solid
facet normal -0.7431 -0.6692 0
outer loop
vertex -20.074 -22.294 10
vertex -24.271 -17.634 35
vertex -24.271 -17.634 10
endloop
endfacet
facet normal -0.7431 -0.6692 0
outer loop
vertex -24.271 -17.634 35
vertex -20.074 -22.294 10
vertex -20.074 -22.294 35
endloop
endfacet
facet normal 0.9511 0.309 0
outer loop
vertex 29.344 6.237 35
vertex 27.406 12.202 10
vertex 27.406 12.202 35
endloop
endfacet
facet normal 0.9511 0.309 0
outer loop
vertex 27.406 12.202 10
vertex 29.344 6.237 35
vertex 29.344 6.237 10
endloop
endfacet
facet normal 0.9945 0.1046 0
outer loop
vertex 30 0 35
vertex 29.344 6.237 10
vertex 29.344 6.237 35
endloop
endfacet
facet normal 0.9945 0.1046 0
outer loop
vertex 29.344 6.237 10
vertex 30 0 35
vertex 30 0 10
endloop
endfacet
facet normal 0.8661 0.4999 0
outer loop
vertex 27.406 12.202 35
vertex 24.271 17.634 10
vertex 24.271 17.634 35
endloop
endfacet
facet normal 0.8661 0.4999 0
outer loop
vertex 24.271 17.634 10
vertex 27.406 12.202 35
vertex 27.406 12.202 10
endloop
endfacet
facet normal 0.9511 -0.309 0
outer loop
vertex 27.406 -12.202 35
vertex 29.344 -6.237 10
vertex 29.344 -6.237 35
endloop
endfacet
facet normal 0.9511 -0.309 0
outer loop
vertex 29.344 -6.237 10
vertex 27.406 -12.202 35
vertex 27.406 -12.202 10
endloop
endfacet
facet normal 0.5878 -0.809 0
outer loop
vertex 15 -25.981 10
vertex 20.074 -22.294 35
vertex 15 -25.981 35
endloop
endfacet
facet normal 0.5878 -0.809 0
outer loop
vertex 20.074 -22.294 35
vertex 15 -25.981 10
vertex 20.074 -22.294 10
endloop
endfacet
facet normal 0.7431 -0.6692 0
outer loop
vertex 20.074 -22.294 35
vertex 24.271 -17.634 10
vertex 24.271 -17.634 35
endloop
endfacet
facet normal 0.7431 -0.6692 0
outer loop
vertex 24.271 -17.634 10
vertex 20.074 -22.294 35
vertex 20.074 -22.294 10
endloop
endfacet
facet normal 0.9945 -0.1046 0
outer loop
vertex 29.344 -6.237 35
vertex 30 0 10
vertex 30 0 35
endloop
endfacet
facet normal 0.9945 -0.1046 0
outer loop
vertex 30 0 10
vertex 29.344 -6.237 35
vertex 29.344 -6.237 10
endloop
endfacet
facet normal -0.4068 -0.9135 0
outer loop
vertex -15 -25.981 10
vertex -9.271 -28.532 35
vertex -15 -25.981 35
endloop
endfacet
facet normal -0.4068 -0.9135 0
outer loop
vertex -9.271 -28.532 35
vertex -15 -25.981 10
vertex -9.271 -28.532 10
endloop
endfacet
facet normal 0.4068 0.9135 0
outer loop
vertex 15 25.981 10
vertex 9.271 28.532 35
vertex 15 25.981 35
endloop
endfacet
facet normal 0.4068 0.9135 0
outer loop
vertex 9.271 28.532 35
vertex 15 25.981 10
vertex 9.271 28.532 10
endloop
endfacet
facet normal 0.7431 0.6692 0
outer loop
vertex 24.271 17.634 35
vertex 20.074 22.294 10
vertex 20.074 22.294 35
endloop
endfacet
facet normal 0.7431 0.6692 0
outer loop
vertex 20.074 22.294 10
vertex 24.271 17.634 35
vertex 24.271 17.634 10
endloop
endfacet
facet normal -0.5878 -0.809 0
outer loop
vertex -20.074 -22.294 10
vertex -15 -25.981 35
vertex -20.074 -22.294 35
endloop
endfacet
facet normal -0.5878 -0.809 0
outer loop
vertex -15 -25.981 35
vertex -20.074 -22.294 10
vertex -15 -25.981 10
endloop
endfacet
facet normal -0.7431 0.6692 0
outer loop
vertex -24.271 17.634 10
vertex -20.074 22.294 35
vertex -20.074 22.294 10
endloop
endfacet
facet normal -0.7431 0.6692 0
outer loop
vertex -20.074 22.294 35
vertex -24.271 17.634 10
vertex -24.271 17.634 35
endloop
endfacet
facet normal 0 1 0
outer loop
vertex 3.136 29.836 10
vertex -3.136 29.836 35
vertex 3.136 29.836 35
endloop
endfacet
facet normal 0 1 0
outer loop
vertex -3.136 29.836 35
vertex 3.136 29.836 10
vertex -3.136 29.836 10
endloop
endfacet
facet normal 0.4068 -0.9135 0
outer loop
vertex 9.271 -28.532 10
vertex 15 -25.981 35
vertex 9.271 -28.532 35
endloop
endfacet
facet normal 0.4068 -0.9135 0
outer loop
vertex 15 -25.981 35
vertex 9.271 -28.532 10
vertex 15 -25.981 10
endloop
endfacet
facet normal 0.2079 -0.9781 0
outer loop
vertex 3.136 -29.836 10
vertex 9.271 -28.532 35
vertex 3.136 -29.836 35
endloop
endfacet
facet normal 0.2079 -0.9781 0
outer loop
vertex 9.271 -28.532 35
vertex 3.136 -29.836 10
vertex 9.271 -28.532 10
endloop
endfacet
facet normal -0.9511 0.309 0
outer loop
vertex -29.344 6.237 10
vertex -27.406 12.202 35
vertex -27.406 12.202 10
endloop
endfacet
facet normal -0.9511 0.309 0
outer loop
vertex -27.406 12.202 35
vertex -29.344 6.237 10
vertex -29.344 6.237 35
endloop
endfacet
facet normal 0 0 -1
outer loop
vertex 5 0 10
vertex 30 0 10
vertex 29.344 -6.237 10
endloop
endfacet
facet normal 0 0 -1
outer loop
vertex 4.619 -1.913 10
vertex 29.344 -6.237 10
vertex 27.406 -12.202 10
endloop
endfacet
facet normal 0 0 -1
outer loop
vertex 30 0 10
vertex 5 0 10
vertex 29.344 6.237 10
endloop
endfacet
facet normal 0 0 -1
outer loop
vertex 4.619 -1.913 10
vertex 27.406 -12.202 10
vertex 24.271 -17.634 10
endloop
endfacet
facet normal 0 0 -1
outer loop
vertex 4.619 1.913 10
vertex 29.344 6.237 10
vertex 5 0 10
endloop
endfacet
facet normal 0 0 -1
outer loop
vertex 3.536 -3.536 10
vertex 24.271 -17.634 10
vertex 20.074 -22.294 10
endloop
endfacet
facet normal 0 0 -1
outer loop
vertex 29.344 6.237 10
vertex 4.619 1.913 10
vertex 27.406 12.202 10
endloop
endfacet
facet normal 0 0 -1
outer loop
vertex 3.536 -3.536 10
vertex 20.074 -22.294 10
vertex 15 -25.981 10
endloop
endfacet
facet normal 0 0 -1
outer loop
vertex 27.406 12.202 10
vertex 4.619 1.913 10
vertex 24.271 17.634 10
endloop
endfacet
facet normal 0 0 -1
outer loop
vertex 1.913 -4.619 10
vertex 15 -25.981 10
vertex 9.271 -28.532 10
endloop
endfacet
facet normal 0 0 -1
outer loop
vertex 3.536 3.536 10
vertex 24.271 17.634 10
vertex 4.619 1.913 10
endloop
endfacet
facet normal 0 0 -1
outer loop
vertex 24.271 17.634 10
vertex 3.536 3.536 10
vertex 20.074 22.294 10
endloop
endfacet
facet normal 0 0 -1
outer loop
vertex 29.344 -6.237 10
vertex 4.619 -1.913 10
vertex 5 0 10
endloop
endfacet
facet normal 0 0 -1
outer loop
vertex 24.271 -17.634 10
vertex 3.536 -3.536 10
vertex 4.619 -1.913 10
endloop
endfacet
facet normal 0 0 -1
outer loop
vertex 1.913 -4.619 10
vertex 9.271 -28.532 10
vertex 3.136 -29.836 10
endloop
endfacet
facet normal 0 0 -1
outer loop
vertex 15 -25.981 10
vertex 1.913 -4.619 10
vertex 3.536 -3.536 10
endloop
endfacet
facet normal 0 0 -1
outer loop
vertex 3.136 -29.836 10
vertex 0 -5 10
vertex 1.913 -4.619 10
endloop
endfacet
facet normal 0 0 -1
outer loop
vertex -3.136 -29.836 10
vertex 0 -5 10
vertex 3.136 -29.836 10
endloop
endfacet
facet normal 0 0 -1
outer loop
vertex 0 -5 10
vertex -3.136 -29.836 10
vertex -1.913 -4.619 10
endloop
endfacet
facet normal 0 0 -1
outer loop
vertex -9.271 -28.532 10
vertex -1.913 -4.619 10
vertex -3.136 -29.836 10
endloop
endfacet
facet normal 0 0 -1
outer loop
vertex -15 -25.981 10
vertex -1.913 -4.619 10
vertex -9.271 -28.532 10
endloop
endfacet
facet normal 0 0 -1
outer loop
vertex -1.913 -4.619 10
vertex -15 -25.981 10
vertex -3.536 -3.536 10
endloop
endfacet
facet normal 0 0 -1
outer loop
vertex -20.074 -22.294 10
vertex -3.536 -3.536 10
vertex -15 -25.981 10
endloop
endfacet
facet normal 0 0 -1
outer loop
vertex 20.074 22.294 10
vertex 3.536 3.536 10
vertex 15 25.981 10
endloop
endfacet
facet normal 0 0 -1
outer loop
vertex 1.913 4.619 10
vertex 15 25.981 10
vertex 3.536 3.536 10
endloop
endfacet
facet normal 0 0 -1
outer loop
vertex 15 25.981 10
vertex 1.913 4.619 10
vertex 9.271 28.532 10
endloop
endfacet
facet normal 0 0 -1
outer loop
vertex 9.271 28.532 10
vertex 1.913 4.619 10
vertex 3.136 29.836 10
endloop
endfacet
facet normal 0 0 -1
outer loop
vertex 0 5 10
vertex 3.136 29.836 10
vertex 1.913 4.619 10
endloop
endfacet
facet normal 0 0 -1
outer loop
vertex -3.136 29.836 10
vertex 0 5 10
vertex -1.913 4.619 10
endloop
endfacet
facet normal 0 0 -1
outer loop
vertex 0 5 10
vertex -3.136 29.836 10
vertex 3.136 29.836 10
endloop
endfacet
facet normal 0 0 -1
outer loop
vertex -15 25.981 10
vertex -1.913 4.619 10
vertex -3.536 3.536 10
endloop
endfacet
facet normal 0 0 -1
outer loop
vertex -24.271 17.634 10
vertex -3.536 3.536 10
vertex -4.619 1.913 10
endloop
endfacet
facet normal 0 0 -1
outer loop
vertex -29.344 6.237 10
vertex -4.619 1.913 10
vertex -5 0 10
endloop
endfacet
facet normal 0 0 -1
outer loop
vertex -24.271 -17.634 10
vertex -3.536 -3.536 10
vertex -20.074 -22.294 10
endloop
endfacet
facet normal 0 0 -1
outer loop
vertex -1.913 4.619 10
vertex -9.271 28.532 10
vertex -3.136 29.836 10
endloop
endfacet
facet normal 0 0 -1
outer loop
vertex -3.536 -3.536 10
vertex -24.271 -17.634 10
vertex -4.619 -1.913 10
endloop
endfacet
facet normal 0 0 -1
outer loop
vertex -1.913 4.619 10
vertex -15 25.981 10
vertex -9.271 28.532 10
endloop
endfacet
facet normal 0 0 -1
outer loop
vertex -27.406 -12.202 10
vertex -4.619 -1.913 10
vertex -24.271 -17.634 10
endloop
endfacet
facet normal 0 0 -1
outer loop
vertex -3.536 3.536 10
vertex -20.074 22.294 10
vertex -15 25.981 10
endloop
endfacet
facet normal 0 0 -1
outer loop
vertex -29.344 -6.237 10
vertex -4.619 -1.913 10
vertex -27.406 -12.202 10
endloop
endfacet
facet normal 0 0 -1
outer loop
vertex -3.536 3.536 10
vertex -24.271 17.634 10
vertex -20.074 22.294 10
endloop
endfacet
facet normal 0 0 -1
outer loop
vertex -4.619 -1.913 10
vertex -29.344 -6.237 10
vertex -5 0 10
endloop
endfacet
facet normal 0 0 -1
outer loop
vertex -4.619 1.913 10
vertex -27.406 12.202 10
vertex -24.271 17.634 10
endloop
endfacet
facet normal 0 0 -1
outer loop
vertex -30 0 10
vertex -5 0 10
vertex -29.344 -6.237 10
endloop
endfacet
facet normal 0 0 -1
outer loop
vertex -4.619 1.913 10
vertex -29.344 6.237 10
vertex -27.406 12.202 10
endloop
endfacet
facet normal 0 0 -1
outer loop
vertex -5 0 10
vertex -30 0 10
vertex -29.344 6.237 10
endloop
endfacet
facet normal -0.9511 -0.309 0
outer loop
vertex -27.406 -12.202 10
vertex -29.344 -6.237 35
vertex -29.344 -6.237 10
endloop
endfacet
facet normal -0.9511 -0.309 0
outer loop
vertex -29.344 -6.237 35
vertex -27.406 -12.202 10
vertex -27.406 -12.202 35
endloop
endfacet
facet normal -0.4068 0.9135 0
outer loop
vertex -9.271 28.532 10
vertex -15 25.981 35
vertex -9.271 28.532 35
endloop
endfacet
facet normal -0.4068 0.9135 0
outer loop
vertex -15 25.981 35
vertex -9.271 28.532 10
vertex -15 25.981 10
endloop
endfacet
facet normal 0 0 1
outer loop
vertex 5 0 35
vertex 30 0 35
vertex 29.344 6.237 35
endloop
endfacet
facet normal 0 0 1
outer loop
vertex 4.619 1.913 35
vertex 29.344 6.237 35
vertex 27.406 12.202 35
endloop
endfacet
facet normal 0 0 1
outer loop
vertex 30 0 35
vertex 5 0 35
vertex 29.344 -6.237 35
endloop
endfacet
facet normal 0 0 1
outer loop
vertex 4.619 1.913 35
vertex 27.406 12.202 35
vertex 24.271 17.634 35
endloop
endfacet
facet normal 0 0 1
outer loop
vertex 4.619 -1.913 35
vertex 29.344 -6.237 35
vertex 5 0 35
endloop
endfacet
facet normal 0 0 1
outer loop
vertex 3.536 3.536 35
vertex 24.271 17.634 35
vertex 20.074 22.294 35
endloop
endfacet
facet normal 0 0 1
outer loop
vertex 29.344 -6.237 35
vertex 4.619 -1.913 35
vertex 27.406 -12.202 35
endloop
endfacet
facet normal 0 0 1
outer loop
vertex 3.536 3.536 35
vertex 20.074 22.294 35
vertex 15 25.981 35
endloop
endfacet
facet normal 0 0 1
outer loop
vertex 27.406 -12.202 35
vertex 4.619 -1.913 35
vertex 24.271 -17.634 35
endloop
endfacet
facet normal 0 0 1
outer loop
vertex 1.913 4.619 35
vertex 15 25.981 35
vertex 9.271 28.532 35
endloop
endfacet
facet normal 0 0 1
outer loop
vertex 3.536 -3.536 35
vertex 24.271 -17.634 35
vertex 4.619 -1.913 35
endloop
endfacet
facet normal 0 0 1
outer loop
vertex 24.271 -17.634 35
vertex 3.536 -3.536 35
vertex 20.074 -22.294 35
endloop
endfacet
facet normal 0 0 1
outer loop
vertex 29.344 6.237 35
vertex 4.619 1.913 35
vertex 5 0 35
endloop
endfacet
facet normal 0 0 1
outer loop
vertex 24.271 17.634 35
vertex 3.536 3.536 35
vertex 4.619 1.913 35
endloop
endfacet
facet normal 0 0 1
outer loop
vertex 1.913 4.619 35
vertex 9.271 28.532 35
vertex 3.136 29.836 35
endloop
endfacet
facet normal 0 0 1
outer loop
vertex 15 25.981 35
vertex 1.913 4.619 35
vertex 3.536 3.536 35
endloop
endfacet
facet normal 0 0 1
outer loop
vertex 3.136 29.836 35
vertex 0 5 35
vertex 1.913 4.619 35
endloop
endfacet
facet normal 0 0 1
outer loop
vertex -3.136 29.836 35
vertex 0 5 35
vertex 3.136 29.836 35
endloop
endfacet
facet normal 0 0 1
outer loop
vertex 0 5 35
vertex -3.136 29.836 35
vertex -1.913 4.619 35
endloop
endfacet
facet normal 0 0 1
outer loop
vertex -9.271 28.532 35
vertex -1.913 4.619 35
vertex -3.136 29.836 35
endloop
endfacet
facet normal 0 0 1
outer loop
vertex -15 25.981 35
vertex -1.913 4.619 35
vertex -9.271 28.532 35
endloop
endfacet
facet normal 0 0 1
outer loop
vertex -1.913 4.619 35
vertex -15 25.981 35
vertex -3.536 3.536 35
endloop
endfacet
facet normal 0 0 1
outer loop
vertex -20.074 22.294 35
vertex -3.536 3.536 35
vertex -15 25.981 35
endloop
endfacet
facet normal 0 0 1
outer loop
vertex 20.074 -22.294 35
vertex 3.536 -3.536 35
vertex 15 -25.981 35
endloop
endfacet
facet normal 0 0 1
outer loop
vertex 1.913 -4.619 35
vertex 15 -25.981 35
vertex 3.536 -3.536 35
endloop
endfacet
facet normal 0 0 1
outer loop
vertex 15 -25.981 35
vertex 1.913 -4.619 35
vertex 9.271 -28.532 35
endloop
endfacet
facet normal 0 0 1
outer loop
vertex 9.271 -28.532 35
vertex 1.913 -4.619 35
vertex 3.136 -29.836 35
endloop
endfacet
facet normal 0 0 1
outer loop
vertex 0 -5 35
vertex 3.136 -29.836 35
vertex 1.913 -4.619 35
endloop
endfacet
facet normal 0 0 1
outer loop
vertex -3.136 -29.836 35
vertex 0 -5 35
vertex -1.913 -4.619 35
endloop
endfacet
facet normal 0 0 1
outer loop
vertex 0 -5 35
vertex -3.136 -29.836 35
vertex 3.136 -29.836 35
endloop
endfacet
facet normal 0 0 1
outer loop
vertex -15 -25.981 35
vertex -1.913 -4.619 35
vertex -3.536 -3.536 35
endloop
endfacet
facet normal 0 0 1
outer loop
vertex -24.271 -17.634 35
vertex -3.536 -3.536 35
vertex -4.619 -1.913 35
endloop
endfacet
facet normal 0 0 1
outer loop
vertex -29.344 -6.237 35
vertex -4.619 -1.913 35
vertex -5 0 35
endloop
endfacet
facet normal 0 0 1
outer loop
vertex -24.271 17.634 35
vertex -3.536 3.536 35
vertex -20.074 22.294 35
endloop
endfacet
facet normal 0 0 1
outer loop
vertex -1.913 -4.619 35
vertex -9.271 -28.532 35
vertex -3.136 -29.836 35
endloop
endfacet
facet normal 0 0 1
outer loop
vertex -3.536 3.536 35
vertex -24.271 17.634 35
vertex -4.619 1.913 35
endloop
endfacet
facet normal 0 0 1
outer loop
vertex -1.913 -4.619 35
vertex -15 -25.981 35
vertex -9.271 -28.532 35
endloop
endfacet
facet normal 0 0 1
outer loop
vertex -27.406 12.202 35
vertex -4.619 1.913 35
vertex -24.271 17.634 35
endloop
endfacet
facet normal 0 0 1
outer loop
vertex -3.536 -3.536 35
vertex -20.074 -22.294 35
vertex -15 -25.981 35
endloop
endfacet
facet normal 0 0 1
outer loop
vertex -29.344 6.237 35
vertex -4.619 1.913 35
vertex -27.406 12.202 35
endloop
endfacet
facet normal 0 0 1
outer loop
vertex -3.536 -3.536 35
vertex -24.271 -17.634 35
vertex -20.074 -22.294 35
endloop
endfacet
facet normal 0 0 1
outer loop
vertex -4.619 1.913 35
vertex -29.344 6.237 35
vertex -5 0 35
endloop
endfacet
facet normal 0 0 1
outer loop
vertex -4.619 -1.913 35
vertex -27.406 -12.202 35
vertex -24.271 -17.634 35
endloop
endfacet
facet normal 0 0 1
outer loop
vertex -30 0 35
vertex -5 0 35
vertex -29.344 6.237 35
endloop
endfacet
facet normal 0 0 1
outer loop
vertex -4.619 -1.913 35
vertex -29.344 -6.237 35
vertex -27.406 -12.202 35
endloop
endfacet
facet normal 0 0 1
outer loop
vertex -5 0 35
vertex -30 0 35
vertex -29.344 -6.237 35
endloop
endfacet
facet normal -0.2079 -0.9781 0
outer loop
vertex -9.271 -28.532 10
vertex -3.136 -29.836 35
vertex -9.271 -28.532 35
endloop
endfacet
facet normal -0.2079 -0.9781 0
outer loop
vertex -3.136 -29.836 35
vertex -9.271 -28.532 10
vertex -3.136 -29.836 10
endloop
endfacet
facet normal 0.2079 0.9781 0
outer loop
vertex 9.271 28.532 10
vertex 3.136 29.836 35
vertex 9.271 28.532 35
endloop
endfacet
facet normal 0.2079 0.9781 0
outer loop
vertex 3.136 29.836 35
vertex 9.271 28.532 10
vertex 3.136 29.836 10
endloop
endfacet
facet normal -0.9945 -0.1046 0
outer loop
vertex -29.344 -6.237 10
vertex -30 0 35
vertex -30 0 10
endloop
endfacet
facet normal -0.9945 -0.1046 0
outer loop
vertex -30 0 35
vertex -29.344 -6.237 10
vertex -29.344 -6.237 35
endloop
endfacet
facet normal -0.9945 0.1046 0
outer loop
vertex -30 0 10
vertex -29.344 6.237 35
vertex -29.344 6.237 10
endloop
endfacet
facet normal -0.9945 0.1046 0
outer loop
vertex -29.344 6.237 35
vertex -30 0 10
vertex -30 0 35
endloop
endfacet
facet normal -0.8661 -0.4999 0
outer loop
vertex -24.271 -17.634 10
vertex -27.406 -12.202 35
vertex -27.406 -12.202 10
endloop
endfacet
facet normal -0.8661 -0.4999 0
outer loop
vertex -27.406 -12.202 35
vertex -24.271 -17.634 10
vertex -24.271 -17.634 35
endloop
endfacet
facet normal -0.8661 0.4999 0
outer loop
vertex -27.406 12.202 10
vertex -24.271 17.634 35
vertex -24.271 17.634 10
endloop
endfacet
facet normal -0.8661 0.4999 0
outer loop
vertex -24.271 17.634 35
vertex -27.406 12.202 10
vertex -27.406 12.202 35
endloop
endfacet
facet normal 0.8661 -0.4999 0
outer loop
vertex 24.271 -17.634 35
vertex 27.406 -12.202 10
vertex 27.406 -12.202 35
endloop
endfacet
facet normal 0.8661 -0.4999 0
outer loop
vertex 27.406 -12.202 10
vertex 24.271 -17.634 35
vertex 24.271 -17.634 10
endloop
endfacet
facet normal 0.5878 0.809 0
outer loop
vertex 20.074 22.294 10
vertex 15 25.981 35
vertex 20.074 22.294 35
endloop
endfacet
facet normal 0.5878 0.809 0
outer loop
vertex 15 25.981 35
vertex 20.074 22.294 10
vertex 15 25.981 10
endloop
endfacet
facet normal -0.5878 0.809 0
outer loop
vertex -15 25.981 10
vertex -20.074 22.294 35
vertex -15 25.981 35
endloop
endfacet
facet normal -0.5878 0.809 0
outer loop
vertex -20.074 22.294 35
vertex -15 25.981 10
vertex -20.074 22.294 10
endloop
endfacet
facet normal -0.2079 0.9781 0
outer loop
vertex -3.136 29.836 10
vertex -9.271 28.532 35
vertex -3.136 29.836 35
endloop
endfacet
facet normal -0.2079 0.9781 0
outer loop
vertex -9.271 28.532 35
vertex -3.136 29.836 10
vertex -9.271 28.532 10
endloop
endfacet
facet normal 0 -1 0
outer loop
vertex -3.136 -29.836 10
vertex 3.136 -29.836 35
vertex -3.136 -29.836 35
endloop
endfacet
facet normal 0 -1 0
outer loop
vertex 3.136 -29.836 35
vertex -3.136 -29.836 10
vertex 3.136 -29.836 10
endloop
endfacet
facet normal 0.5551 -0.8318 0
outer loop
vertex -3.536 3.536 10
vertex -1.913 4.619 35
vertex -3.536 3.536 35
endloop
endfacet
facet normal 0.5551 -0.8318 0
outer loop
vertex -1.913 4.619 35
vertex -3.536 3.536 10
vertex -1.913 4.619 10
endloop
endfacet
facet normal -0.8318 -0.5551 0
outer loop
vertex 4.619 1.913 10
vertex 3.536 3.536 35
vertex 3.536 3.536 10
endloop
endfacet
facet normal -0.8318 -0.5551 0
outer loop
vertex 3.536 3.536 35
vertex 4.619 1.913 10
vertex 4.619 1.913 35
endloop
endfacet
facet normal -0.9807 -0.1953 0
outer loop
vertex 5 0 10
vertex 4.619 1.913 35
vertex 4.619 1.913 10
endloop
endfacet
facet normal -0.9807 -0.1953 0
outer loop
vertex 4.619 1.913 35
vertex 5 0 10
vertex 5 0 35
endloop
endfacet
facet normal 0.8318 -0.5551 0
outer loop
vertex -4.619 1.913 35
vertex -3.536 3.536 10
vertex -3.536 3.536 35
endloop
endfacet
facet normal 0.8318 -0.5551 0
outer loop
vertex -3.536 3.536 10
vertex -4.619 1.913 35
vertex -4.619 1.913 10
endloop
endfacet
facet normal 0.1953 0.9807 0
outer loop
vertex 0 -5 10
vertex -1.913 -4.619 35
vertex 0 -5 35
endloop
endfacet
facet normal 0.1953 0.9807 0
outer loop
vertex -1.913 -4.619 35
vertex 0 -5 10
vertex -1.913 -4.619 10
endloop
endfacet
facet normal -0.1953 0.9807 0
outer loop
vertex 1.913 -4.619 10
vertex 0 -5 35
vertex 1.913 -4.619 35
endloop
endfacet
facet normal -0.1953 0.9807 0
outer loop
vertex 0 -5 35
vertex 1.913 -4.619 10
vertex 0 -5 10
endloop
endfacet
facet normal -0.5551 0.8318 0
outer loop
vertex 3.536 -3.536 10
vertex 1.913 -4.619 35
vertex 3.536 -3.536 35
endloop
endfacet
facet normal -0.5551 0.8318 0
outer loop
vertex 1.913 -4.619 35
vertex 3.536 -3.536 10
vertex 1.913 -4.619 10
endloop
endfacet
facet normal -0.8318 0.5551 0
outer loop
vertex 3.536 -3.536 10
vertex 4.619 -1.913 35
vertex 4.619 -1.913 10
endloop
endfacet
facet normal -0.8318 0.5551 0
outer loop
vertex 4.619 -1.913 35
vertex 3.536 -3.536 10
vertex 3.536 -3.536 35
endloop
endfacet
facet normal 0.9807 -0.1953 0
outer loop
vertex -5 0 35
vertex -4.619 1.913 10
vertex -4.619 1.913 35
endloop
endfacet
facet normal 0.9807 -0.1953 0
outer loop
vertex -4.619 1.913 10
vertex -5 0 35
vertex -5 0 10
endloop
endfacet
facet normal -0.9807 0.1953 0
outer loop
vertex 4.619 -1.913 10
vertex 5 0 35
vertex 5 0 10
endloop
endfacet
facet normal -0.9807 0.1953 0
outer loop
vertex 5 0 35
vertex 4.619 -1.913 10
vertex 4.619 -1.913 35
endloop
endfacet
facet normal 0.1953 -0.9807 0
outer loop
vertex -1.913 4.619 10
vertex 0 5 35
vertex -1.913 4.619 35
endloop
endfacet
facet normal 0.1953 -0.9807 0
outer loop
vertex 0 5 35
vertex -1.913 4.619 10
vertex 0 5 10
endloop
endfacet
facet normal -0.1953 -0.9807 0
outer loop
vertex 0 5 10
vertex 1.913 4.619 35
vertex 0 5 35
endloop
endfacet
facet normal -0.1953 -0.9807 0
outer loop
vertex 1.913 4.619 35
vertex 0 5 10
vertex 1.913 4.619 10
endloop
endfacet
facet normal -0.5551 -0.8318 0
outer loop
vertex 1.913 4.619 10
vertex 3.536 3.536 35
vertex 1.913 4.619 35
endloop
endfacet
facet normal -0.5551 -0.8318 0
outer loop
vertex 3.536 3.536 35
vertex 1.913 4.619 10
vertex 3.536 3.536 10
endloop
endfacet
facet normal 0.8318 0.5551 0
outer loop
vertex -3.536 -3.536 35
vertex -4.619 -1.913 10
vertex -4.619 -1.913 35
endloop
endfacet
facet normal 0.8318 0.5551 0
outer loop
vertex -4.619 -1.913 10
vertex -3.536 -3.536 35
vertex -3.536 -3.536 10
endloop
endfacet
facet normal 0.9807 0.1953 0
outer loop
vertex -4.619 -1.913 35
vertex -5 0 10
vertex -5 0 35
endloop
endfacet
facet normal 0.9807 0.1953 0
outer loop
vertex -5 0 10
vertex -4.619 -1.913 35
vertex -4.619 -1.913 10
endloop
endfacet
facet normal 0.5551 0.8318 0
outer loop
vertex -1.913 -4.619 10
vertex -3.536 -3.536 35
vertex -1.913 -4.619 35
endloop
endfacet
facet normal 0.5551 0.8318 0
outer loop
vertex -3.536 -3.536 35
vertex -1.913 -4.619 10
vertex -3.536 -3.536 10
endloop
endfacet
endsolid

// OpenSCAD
difference(){
    translate([0,0,10])
    cylinder(25,30,30);
    translate([0,0,10])
        cylinder(45,5,5);
}
